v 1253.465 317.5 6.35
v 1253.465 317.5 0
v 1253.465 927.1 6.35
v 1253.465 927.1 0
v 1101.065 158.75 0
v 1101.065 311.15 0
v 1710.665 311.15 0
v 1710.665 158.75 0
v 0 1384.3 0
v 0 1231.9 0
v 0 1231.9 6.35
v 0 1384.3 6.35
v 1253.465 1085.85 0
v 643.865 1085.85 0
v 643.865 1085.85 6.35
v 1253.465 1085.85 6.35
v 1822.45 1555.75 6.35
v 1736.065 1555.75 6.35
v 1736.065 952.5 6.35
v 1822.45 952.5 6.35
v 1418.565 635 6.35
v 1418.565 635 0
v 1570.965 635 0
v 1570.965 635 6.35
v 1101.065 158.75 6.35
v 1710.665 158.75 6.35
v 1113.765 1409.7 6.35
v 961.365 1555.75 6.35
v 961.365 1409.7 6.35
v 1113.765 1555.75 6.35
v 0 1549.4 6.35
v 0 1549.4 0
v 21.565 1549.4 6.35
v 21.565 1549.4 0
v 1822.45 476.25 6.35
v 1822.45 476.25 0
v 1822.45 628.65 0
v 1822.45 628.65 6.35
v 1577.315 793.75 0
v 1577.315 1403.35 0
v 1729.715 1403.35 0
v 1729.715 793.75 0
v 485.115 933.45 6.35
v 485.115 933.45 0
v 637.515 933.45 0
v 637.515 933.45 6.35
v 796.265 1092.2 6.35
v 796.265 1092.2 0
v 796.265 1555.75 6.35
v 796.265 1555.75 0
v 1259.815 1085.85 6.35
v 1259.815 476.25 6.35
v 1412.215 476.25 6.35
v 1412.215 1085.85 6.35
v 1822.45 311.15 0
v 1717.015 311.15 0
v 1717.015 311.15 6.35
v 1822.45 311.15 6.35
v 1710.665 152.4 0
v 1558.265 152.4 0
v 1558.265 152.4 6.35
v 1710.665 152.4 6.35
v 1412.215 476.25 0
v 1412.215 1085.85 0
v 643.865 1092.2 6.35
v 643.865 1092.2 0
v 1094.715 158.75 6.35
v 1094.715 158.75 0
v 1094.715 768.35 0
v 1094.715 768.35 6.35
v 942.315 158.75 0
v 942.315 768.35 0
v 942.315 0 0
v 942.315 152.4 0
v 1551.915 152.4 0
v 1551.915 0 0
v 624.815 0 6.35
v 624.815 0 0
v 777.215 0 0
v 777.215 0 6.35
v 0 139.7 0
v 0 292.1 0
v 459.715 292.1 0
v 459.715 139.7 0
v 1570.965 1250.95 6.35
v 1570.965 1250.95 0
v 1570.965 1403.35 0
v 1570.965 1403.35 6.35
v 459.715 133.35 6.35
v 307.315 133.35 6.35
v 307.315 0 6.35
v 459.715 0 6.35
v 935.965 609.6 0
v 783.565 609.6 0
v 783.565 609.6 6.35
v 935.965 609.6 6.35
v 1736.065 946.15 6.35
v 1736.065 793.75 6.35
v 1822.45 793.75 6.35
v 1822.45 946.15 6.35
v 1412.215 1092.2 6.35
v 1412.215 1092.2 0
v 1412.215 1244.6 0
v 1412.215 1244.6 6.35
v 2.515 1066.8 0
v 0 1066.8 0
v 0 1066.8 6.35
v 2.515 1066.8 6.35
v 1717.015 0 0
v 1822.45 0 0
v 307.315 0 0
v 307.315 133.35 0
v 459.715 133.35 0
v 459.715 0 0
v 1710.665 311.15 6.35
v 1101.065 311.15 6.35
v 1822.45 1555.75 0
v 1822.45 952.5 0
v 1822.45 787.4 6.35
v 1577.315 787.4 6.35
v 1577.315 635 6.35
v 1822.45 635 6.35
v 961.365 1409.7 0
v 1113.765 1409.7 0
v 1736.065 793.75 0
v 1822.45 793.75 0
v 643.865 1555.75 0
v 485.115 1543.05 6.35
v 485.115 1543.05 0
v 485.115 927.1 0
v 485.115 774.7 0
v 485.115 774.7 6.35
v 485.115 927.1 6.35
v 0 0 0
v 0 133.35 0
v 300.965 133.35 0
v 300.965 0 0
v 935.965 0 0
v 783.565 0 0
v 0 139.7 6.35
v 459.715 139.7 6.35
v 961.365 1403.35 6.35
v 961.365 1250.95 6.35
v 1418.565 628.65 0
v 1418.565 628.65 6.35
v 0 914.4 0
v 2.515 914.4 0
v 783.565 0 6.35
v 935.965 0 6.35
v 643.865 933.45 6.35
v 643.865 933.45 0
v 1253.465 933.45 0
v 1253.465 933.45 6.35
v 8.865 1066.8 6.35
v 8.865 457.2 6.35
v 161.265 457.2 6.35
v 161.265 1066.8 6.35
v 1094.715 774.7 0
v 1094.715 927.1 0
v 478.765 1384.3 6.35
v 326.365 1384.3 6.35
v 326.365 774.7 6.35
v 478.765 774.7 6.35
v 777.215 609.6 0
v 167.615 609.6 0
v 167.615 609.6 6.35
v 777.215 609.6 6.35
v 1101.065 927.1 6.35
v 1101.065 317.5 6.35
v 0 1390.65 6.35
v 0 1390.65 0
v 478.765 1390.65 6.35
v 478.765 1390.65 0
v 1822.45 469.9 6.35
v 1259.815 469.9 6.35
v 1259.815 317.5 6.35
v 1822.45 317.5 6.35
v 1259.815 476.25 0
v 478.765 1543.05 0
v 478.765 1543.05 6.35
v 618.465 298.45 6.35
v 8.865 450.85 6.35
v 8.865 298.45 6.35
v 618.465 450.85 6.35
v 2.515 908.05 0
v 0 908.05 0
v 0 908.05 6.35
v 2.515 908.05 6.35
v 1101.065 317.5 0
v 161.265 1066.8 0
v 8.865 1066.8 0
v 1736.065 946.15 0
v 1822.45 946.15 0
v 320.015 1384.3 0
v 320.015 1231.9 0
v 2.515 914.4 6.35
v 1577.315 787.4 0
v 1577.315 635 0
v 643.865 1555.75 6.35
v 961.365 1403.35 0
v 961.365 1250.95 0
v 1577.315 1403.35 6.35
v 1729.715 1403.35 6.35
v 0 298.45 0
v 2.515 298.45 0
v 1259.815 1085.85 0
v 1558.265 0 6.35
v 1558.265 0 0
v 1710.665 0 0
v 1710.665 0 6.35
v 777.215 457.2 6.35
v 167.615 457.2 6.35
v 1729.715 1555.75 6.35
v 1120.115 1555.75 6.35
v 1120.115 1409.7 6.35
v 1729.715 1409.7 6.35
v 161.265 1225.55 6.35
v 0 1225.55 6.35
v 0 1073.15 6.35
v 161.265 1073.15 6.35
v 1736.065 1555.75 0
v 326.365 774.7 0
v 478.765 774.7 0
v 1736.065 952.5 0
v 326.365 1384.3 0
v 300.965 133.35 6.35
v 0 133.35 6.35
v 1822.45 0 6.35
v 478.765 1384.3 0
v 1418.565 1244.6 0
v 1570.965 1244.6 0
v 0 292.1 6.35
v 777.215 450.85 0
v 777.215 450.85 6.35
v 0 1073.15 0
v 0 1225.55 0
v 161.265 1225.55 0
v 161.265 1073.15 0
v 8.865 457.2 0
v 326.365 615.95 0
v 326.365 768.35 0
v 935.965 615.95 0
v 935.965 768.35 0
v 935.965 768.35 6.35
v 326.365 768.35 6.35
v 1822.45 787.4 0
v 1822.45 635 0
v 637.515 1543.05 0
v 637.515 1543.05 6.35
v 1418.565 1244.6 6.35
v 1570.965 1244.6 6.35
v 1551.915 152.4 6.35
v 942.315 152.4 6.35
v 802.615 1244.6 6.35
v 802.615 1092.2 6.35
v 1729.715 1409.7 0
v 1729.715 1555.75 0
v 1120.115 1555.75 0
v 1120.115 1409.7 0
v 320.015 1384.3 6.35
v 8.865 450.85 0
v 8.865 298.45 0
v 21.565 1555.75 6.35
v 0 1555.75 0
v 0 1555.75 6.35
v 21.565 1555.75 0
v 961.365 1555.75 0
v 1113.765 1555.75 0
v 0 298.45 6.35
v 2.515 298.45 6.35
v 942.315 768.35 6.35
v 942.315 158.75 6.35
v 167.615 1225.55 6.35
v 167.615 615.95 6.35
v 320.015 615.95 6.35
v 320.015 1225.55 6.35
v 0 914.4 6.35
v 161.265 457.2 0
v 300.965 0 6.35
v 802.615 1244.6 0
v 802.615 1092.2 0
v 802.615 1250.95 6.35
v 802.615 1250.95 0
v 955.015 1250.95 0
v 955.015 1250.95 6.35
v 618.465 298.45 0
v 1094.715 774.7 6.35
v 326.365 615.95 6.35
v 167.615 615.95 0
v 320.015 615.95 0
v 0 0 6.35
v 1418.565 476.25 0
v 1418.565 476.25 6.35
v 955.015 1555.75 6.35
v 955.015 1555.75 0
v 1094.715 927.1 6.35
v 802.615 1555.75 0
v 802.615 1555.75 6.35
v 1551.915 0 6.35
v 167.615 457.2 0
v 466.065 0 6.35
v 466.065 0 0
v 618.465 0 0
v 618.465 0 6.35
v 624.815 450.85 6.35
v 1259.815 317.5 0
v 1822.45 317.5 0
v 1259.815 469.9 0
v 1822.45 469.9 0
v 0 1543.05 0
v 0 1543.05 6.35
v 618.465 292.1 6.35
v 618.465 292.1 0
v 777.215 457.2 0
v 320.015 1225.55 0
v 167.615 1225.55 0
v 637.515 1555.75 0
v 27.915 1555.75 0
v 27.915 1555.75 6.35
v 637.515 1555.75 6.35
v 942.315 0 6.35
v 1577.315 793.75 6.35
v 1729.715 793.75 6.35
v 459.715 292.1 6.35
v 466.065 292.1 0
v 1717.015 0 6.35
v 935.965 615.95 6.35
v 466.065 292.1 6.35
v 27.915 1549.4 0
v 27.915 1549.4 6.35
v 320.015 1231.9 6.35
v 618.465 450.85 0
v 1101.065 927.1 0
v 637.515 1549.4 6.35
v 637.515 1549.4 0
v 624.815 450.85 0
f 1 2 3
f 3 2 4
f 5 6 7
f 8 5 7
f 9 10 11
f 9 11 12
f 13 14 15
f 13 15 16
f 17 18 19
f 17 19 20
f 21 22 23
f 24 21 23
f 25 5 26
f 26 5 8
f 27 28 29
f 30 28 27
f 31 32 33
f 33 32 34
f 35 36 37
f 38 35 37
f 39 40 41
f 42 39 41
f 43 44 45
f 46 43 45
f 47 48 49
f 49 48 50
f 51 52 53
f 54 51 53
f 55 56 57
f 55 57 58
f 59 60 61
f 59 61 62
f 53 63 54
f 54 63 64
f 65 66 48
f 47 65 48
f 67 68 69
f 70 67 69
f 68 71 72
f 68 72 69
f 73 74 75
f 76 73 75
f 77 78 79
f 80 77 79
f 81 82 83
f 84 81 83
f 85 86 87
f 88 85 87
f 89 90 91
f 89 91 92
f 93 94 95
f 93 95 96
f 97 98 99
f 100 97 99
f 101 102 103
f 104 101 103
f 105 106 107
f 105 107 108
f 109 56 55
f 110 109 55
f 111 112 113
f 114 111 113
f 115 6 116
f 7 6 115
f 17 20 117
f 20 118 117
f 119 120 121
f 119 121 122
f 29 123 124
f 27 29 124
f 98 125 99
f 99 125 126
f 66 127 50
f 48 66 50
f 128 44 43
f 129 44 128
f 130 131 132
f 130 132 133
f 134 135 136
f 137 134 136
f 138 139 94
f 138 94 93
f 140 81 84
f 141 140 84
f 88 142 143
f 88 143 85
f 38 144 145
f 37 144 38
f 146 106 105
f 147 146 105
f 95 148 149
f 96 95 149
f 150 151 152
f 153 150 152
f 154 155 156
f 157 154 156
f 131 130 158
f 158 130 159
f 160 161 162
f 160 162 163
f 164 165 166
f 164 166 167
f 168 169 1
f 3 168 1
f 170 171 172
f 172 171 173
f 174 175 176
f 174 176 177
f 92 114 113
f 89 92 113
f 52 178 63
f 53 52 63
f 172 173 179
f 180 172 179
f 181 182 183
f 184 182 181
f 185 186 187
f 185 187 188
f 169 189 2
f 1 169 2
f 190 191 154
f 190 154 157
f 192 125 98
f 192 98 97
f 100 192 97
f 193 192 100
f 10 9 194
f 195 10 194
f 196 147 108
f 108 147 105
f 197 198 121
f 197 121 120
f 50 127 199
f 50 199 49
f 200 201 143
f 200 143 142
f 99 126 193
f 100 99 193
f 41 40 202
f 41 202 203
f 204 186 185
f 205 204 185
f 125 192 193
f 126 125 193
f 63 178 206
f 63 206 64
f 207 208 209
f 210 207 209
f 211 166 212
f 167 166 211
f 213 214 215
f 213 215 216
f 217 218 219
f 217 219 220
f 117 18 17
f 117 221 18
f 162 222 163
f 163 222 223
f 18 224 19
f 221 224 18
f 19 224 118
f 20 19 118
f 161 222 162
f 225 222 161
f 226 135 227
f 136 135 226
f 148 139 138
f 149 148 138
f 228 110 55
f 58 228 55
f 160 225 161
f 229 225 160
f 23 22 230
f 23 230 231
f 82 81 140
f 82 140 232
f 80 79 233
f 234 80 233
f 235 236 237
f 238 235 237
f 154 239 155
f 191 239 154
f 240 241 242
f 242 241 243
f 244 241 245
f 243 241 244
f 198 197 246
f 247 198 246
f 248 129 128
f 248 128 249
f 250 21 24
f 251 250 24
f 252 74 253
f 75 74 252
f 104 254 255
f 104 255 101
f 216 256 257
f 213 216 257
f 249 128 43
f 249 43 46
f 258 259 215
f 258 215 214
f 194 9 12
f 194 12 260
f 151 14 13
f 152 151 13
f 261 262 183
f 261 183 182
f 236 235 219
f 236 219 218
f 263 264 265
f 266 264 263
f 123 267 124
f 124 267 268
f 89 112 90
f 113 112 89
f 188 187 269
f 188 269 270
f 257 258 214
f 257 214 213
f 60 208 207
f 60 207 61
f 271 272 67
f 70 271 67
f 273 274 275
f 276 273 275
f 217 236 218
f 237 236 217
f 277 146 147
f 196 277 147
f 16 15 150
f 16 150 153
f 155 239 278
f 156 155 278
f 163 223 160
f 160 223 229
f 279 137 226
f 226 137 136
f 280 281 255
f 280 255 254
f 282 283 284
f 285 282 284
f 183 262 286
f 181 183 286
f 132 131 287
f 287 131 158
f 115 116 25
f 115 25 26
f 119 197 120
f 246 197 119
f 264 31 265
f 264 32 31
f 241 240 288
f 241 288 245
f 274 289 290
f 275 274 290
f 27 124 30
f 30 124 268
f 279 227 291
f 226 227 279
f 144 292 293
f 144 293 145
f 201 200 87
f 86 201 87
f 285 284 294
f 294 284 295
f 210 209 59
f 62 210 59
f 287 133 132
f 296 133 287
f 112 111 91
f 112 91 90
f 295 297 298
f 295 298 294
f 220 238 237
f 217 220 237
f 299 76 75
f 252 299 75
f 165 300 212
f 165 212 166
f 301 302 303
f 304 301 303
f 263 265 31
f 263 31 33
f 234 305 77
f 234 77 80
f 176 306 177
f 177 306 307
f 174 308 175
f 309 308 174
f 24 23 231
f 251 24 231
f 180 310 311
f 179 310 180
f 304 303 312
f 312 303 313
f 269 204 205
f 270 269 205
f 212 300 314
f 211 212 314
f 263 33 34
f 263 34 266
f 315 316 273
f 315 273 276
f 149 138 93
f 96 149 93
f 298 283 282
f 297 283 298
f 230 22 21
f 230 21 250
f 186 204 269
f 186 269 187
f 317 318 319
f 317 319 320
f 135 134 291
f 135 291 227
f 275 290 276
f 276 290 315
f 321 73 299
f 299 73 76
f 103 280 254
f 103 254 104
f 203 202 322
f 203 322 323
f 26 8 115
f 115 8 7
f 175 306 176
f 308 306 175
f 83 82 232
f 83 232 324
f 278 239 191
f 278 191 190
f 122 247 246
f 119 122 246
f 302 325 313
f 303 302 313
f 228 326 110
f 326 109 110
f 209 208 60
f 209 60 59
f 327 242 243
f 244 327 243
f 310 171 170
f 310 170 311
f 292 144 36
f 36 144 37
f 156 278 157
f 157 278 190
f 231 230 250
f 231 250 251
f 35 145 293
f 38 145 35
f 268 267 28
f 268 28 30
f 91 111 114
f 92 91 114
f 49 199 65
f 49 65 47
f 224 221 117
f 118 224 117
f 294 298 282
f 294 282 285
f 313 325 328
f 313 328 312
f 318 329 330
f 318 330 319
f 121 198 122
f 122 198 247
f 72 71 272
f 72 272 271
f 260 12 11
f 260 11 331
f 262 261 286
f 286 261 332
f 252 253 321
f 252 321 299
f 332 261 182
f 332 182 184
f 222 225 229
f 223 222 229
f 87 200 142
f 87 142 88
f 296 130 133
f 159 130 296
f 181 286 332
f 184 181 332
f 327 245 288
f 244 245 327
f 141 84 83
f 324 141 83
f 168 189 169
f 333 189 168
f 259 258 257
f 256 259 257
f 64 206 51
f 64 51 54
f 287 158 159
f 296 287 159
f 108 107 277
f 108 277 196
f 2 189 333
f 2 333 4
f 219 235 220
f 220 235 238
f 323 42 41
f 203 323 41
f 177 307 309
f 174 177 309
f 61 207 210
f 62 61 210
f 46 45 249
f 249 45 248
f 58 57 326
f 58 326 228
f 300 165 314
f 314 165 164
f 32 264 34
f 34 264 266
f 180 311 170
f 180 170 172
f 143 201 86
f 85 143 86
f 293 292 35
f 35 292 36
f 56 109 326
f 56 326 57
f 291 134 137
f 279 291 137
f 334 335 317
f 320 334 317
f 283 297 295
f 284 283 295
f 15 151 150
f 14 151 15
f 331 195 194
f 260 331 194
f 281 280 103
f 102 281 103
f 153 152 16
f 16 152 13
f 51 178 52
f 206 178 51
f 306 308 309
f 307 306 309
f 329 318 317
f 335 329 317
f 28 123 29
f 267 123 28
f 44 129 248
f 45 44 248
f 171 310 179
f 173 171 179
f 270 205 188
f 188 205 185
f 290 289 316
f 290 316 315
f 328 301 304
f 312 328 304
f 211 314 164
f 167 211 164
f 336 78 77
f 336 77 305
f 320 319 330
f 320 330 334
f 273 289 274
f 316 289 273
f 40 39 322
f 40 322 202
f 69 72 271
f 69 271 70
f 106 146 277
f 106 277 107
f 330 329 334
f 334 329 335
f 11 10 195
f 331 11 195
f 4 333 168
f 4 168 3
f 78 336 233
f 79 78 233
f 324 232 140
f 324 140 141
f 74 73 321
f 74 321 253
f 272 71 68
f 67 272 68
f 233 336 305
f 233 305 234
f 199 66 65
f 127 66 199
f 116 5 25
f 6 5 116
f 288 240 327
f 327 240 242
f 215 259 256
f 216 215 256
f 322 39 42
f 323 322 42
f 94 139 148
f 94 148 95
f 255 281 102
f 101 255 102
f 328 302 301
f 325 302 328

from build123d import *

# Parameters (mm, degrees)
F1_W     = 609.6
F1_H     = 152.4
F1_W_2   = 152.4
F1_H_2   = 609.6
F2_DEPTH = 6.35
F3_W     = 4289.612889
F3_H     = 4005.097747
F3_W_2   = 1822.45
F3_H_2   = 1555.75
F4_DEPTH = 6.351


with BuildPart() as f2:
    # F1 (on Top) → F2 (new body)
    with BuildSketch(Plane.XY):
        with Locations((1247.115459, 76.2)):
            Rectangle(F1_W, F1_H)
        with Locations((1018.515459, 463.55)):
            Rectangle(F1_W_2, F1_H_2)
        with Locations((1405.865459, 234.95)):
            Rectangle(F1_W, F1_H)
        with Locations((1177.265459, 622.3)):
            Rectangle(F1_W_2, F1_H_2)
        with Locations((859.765459, 304.8)):
            Rectangle(F1_W_2, F1_H_2)
        with Locations((472.415459, 533.4)):
            Rectangle(F1_W, F1_H)
        with Locations((701.015459, 146.05)):
            Rectangle(F1_W_2, F1_H_2)
        with Locations((313.665459, 374.65)):
            Rectangle(F1_W, F1_H)
        with Locations((542.265459, -12.7)):
            Rectangle(F1_W_2, F1_H_2)
        with Locations((154.915459, 215.9)):
            Rectangle(F1_W, F1_H)
        with Locations((383.515459, -171.45)):
            Rectangle(F1_W_2, F1_H_2)
        with Locations((224.765459, -330.2)):
            Rectangle(F1_W_2, F1_H_2)
        with Locations((-3.834541, 57.15)):
            Rectangle(F1_W, F1_H)
        with Locations((631.165459, 692.15)):
            Rectangle(F1_W, F1_H)
        with Locations((789.915459, 850.9)):
            Rectangle(F1_W, F1_H)
        with Locations((948.665459, 1009.65)):
            Rectangle(F1_W, F1_H)
        with Locations((1564.615459, 393.7)):
            Rectangle(F1_W, F1_H)
        with Locations((1336.015459, 781.05)):
            Rectangle(F1_W_2, F1_H_2)
        with Locations((1723.365459, 552.45)):
            Rectangle(F1_W, F1_H)
        with Locations((1494.765459, 939.8)):
            Rectangle(F1_W_2, F1_H_2)
        with Locations((1882.115459, 711.2)):
            Rectangle(F1_W, F1_H)
        with Locations((1107.415459, 1168.4)):
            Rectangle(F1_W, F1_H)
        with Locations((1653.515459, 1098.55)):
            Rectangle(F1_W_2, F1_H_2)
        with Locations((2040.865459, 869.95)):
            Rectangle(F1_W, F1_H)
        with Locations((1266.165459, 1327.15)):
            Rectangle(F1_W, F1_H)
        with Locations((878.815459, 1555.75)):
            Rectangle(F1_W_2, F1_H_2)
        with Locations((720.065459, 1397)):
            Rectangle(F1_W_2, F1_H_2)
        with Locations((561.315459, 1238.25)):
            Rectangle(F1_W_2, F1_H_2)
        with Locations((402.565459, 1079.5)):
            Rectangle(F1_W_2, F1_H_2)
        with Locations((243.815459, 920.75)):
            Rectangle(F1_W_2, F1_H_2)
        with Locations((85.065459, 762)):
            Rectangle(F1_W_2, F1_H_2)
        with Locations((1634.465459, -152.4)):
            Rectangle(F1_W_2, F1_H_2)
        with Locations((1793.215459, 6.35)):
            Rectangle(F1_W_2, F1_H_2)
        with Locations((1951.965459, 165.1)):
            Rectangle(F1_W_2, F1_H_2)
        with Locations((-73.684541, 603.25)):
            Rectangle(F1_W_2, F1_H_2)
        with Locations((1037.565459, 1714.5)):
            Rectangle(F1_W_2, F1_H_2)
        with Locations((1424.915459, 1485.9)):
            Rectangle(F1_W, F1_H)
        with Locations((-232.434541, 444.5)):
            Rectangle(F1_W_2, F1_H_2)
        with Locations((-461.034541, 831.85)):
            Rectangle(F1_W, F1_H)
        with Locations((-302.284541, 990.6)):
            Rectangle(F1_W, F1_H)
        with Locations((-143.534541, 1149.35)):
            Rectangle(F1_W, F1_H)
        with Locations((15.215459, 1308.1)):
            Rectangle(F1_W, F1_H)
        with Locations((173.965459, 1466.85)):
            Rectangle(F1_W, F1_H)
        with Locations((332.715459, 1625.6)):
            Rectangle(F1_W, F1_H)
        with Locations((-54.634541, 1854.2)):
            Rectangle(F1_W_2, F1_H_2)
        with Locations((-213.384541, 1695.45)):
            Rectangle(F1_W_2, F1_H_2)
        with Locations((1812.265459, 1257.3)):
            Rectangle(F1_W_2, F1_H_2)
    extrude(amount=F2_DEPTH)

    # F3 (on Top) → F4 (cut, through all)
    with BuildSketch(Plane.XY):
        with Locations((857.388675, 780.000746)):
            Rectangle(F3_W, F3_H)
        with Locations((911.225, 777.875)):
            Rectangle(F3_W_2, F3_H_2, mode=Mode.SUBTRACT)
    extrude(amount=F4_DEPTH, mode=Mode.SUBTRACT)


solid = f2.part
